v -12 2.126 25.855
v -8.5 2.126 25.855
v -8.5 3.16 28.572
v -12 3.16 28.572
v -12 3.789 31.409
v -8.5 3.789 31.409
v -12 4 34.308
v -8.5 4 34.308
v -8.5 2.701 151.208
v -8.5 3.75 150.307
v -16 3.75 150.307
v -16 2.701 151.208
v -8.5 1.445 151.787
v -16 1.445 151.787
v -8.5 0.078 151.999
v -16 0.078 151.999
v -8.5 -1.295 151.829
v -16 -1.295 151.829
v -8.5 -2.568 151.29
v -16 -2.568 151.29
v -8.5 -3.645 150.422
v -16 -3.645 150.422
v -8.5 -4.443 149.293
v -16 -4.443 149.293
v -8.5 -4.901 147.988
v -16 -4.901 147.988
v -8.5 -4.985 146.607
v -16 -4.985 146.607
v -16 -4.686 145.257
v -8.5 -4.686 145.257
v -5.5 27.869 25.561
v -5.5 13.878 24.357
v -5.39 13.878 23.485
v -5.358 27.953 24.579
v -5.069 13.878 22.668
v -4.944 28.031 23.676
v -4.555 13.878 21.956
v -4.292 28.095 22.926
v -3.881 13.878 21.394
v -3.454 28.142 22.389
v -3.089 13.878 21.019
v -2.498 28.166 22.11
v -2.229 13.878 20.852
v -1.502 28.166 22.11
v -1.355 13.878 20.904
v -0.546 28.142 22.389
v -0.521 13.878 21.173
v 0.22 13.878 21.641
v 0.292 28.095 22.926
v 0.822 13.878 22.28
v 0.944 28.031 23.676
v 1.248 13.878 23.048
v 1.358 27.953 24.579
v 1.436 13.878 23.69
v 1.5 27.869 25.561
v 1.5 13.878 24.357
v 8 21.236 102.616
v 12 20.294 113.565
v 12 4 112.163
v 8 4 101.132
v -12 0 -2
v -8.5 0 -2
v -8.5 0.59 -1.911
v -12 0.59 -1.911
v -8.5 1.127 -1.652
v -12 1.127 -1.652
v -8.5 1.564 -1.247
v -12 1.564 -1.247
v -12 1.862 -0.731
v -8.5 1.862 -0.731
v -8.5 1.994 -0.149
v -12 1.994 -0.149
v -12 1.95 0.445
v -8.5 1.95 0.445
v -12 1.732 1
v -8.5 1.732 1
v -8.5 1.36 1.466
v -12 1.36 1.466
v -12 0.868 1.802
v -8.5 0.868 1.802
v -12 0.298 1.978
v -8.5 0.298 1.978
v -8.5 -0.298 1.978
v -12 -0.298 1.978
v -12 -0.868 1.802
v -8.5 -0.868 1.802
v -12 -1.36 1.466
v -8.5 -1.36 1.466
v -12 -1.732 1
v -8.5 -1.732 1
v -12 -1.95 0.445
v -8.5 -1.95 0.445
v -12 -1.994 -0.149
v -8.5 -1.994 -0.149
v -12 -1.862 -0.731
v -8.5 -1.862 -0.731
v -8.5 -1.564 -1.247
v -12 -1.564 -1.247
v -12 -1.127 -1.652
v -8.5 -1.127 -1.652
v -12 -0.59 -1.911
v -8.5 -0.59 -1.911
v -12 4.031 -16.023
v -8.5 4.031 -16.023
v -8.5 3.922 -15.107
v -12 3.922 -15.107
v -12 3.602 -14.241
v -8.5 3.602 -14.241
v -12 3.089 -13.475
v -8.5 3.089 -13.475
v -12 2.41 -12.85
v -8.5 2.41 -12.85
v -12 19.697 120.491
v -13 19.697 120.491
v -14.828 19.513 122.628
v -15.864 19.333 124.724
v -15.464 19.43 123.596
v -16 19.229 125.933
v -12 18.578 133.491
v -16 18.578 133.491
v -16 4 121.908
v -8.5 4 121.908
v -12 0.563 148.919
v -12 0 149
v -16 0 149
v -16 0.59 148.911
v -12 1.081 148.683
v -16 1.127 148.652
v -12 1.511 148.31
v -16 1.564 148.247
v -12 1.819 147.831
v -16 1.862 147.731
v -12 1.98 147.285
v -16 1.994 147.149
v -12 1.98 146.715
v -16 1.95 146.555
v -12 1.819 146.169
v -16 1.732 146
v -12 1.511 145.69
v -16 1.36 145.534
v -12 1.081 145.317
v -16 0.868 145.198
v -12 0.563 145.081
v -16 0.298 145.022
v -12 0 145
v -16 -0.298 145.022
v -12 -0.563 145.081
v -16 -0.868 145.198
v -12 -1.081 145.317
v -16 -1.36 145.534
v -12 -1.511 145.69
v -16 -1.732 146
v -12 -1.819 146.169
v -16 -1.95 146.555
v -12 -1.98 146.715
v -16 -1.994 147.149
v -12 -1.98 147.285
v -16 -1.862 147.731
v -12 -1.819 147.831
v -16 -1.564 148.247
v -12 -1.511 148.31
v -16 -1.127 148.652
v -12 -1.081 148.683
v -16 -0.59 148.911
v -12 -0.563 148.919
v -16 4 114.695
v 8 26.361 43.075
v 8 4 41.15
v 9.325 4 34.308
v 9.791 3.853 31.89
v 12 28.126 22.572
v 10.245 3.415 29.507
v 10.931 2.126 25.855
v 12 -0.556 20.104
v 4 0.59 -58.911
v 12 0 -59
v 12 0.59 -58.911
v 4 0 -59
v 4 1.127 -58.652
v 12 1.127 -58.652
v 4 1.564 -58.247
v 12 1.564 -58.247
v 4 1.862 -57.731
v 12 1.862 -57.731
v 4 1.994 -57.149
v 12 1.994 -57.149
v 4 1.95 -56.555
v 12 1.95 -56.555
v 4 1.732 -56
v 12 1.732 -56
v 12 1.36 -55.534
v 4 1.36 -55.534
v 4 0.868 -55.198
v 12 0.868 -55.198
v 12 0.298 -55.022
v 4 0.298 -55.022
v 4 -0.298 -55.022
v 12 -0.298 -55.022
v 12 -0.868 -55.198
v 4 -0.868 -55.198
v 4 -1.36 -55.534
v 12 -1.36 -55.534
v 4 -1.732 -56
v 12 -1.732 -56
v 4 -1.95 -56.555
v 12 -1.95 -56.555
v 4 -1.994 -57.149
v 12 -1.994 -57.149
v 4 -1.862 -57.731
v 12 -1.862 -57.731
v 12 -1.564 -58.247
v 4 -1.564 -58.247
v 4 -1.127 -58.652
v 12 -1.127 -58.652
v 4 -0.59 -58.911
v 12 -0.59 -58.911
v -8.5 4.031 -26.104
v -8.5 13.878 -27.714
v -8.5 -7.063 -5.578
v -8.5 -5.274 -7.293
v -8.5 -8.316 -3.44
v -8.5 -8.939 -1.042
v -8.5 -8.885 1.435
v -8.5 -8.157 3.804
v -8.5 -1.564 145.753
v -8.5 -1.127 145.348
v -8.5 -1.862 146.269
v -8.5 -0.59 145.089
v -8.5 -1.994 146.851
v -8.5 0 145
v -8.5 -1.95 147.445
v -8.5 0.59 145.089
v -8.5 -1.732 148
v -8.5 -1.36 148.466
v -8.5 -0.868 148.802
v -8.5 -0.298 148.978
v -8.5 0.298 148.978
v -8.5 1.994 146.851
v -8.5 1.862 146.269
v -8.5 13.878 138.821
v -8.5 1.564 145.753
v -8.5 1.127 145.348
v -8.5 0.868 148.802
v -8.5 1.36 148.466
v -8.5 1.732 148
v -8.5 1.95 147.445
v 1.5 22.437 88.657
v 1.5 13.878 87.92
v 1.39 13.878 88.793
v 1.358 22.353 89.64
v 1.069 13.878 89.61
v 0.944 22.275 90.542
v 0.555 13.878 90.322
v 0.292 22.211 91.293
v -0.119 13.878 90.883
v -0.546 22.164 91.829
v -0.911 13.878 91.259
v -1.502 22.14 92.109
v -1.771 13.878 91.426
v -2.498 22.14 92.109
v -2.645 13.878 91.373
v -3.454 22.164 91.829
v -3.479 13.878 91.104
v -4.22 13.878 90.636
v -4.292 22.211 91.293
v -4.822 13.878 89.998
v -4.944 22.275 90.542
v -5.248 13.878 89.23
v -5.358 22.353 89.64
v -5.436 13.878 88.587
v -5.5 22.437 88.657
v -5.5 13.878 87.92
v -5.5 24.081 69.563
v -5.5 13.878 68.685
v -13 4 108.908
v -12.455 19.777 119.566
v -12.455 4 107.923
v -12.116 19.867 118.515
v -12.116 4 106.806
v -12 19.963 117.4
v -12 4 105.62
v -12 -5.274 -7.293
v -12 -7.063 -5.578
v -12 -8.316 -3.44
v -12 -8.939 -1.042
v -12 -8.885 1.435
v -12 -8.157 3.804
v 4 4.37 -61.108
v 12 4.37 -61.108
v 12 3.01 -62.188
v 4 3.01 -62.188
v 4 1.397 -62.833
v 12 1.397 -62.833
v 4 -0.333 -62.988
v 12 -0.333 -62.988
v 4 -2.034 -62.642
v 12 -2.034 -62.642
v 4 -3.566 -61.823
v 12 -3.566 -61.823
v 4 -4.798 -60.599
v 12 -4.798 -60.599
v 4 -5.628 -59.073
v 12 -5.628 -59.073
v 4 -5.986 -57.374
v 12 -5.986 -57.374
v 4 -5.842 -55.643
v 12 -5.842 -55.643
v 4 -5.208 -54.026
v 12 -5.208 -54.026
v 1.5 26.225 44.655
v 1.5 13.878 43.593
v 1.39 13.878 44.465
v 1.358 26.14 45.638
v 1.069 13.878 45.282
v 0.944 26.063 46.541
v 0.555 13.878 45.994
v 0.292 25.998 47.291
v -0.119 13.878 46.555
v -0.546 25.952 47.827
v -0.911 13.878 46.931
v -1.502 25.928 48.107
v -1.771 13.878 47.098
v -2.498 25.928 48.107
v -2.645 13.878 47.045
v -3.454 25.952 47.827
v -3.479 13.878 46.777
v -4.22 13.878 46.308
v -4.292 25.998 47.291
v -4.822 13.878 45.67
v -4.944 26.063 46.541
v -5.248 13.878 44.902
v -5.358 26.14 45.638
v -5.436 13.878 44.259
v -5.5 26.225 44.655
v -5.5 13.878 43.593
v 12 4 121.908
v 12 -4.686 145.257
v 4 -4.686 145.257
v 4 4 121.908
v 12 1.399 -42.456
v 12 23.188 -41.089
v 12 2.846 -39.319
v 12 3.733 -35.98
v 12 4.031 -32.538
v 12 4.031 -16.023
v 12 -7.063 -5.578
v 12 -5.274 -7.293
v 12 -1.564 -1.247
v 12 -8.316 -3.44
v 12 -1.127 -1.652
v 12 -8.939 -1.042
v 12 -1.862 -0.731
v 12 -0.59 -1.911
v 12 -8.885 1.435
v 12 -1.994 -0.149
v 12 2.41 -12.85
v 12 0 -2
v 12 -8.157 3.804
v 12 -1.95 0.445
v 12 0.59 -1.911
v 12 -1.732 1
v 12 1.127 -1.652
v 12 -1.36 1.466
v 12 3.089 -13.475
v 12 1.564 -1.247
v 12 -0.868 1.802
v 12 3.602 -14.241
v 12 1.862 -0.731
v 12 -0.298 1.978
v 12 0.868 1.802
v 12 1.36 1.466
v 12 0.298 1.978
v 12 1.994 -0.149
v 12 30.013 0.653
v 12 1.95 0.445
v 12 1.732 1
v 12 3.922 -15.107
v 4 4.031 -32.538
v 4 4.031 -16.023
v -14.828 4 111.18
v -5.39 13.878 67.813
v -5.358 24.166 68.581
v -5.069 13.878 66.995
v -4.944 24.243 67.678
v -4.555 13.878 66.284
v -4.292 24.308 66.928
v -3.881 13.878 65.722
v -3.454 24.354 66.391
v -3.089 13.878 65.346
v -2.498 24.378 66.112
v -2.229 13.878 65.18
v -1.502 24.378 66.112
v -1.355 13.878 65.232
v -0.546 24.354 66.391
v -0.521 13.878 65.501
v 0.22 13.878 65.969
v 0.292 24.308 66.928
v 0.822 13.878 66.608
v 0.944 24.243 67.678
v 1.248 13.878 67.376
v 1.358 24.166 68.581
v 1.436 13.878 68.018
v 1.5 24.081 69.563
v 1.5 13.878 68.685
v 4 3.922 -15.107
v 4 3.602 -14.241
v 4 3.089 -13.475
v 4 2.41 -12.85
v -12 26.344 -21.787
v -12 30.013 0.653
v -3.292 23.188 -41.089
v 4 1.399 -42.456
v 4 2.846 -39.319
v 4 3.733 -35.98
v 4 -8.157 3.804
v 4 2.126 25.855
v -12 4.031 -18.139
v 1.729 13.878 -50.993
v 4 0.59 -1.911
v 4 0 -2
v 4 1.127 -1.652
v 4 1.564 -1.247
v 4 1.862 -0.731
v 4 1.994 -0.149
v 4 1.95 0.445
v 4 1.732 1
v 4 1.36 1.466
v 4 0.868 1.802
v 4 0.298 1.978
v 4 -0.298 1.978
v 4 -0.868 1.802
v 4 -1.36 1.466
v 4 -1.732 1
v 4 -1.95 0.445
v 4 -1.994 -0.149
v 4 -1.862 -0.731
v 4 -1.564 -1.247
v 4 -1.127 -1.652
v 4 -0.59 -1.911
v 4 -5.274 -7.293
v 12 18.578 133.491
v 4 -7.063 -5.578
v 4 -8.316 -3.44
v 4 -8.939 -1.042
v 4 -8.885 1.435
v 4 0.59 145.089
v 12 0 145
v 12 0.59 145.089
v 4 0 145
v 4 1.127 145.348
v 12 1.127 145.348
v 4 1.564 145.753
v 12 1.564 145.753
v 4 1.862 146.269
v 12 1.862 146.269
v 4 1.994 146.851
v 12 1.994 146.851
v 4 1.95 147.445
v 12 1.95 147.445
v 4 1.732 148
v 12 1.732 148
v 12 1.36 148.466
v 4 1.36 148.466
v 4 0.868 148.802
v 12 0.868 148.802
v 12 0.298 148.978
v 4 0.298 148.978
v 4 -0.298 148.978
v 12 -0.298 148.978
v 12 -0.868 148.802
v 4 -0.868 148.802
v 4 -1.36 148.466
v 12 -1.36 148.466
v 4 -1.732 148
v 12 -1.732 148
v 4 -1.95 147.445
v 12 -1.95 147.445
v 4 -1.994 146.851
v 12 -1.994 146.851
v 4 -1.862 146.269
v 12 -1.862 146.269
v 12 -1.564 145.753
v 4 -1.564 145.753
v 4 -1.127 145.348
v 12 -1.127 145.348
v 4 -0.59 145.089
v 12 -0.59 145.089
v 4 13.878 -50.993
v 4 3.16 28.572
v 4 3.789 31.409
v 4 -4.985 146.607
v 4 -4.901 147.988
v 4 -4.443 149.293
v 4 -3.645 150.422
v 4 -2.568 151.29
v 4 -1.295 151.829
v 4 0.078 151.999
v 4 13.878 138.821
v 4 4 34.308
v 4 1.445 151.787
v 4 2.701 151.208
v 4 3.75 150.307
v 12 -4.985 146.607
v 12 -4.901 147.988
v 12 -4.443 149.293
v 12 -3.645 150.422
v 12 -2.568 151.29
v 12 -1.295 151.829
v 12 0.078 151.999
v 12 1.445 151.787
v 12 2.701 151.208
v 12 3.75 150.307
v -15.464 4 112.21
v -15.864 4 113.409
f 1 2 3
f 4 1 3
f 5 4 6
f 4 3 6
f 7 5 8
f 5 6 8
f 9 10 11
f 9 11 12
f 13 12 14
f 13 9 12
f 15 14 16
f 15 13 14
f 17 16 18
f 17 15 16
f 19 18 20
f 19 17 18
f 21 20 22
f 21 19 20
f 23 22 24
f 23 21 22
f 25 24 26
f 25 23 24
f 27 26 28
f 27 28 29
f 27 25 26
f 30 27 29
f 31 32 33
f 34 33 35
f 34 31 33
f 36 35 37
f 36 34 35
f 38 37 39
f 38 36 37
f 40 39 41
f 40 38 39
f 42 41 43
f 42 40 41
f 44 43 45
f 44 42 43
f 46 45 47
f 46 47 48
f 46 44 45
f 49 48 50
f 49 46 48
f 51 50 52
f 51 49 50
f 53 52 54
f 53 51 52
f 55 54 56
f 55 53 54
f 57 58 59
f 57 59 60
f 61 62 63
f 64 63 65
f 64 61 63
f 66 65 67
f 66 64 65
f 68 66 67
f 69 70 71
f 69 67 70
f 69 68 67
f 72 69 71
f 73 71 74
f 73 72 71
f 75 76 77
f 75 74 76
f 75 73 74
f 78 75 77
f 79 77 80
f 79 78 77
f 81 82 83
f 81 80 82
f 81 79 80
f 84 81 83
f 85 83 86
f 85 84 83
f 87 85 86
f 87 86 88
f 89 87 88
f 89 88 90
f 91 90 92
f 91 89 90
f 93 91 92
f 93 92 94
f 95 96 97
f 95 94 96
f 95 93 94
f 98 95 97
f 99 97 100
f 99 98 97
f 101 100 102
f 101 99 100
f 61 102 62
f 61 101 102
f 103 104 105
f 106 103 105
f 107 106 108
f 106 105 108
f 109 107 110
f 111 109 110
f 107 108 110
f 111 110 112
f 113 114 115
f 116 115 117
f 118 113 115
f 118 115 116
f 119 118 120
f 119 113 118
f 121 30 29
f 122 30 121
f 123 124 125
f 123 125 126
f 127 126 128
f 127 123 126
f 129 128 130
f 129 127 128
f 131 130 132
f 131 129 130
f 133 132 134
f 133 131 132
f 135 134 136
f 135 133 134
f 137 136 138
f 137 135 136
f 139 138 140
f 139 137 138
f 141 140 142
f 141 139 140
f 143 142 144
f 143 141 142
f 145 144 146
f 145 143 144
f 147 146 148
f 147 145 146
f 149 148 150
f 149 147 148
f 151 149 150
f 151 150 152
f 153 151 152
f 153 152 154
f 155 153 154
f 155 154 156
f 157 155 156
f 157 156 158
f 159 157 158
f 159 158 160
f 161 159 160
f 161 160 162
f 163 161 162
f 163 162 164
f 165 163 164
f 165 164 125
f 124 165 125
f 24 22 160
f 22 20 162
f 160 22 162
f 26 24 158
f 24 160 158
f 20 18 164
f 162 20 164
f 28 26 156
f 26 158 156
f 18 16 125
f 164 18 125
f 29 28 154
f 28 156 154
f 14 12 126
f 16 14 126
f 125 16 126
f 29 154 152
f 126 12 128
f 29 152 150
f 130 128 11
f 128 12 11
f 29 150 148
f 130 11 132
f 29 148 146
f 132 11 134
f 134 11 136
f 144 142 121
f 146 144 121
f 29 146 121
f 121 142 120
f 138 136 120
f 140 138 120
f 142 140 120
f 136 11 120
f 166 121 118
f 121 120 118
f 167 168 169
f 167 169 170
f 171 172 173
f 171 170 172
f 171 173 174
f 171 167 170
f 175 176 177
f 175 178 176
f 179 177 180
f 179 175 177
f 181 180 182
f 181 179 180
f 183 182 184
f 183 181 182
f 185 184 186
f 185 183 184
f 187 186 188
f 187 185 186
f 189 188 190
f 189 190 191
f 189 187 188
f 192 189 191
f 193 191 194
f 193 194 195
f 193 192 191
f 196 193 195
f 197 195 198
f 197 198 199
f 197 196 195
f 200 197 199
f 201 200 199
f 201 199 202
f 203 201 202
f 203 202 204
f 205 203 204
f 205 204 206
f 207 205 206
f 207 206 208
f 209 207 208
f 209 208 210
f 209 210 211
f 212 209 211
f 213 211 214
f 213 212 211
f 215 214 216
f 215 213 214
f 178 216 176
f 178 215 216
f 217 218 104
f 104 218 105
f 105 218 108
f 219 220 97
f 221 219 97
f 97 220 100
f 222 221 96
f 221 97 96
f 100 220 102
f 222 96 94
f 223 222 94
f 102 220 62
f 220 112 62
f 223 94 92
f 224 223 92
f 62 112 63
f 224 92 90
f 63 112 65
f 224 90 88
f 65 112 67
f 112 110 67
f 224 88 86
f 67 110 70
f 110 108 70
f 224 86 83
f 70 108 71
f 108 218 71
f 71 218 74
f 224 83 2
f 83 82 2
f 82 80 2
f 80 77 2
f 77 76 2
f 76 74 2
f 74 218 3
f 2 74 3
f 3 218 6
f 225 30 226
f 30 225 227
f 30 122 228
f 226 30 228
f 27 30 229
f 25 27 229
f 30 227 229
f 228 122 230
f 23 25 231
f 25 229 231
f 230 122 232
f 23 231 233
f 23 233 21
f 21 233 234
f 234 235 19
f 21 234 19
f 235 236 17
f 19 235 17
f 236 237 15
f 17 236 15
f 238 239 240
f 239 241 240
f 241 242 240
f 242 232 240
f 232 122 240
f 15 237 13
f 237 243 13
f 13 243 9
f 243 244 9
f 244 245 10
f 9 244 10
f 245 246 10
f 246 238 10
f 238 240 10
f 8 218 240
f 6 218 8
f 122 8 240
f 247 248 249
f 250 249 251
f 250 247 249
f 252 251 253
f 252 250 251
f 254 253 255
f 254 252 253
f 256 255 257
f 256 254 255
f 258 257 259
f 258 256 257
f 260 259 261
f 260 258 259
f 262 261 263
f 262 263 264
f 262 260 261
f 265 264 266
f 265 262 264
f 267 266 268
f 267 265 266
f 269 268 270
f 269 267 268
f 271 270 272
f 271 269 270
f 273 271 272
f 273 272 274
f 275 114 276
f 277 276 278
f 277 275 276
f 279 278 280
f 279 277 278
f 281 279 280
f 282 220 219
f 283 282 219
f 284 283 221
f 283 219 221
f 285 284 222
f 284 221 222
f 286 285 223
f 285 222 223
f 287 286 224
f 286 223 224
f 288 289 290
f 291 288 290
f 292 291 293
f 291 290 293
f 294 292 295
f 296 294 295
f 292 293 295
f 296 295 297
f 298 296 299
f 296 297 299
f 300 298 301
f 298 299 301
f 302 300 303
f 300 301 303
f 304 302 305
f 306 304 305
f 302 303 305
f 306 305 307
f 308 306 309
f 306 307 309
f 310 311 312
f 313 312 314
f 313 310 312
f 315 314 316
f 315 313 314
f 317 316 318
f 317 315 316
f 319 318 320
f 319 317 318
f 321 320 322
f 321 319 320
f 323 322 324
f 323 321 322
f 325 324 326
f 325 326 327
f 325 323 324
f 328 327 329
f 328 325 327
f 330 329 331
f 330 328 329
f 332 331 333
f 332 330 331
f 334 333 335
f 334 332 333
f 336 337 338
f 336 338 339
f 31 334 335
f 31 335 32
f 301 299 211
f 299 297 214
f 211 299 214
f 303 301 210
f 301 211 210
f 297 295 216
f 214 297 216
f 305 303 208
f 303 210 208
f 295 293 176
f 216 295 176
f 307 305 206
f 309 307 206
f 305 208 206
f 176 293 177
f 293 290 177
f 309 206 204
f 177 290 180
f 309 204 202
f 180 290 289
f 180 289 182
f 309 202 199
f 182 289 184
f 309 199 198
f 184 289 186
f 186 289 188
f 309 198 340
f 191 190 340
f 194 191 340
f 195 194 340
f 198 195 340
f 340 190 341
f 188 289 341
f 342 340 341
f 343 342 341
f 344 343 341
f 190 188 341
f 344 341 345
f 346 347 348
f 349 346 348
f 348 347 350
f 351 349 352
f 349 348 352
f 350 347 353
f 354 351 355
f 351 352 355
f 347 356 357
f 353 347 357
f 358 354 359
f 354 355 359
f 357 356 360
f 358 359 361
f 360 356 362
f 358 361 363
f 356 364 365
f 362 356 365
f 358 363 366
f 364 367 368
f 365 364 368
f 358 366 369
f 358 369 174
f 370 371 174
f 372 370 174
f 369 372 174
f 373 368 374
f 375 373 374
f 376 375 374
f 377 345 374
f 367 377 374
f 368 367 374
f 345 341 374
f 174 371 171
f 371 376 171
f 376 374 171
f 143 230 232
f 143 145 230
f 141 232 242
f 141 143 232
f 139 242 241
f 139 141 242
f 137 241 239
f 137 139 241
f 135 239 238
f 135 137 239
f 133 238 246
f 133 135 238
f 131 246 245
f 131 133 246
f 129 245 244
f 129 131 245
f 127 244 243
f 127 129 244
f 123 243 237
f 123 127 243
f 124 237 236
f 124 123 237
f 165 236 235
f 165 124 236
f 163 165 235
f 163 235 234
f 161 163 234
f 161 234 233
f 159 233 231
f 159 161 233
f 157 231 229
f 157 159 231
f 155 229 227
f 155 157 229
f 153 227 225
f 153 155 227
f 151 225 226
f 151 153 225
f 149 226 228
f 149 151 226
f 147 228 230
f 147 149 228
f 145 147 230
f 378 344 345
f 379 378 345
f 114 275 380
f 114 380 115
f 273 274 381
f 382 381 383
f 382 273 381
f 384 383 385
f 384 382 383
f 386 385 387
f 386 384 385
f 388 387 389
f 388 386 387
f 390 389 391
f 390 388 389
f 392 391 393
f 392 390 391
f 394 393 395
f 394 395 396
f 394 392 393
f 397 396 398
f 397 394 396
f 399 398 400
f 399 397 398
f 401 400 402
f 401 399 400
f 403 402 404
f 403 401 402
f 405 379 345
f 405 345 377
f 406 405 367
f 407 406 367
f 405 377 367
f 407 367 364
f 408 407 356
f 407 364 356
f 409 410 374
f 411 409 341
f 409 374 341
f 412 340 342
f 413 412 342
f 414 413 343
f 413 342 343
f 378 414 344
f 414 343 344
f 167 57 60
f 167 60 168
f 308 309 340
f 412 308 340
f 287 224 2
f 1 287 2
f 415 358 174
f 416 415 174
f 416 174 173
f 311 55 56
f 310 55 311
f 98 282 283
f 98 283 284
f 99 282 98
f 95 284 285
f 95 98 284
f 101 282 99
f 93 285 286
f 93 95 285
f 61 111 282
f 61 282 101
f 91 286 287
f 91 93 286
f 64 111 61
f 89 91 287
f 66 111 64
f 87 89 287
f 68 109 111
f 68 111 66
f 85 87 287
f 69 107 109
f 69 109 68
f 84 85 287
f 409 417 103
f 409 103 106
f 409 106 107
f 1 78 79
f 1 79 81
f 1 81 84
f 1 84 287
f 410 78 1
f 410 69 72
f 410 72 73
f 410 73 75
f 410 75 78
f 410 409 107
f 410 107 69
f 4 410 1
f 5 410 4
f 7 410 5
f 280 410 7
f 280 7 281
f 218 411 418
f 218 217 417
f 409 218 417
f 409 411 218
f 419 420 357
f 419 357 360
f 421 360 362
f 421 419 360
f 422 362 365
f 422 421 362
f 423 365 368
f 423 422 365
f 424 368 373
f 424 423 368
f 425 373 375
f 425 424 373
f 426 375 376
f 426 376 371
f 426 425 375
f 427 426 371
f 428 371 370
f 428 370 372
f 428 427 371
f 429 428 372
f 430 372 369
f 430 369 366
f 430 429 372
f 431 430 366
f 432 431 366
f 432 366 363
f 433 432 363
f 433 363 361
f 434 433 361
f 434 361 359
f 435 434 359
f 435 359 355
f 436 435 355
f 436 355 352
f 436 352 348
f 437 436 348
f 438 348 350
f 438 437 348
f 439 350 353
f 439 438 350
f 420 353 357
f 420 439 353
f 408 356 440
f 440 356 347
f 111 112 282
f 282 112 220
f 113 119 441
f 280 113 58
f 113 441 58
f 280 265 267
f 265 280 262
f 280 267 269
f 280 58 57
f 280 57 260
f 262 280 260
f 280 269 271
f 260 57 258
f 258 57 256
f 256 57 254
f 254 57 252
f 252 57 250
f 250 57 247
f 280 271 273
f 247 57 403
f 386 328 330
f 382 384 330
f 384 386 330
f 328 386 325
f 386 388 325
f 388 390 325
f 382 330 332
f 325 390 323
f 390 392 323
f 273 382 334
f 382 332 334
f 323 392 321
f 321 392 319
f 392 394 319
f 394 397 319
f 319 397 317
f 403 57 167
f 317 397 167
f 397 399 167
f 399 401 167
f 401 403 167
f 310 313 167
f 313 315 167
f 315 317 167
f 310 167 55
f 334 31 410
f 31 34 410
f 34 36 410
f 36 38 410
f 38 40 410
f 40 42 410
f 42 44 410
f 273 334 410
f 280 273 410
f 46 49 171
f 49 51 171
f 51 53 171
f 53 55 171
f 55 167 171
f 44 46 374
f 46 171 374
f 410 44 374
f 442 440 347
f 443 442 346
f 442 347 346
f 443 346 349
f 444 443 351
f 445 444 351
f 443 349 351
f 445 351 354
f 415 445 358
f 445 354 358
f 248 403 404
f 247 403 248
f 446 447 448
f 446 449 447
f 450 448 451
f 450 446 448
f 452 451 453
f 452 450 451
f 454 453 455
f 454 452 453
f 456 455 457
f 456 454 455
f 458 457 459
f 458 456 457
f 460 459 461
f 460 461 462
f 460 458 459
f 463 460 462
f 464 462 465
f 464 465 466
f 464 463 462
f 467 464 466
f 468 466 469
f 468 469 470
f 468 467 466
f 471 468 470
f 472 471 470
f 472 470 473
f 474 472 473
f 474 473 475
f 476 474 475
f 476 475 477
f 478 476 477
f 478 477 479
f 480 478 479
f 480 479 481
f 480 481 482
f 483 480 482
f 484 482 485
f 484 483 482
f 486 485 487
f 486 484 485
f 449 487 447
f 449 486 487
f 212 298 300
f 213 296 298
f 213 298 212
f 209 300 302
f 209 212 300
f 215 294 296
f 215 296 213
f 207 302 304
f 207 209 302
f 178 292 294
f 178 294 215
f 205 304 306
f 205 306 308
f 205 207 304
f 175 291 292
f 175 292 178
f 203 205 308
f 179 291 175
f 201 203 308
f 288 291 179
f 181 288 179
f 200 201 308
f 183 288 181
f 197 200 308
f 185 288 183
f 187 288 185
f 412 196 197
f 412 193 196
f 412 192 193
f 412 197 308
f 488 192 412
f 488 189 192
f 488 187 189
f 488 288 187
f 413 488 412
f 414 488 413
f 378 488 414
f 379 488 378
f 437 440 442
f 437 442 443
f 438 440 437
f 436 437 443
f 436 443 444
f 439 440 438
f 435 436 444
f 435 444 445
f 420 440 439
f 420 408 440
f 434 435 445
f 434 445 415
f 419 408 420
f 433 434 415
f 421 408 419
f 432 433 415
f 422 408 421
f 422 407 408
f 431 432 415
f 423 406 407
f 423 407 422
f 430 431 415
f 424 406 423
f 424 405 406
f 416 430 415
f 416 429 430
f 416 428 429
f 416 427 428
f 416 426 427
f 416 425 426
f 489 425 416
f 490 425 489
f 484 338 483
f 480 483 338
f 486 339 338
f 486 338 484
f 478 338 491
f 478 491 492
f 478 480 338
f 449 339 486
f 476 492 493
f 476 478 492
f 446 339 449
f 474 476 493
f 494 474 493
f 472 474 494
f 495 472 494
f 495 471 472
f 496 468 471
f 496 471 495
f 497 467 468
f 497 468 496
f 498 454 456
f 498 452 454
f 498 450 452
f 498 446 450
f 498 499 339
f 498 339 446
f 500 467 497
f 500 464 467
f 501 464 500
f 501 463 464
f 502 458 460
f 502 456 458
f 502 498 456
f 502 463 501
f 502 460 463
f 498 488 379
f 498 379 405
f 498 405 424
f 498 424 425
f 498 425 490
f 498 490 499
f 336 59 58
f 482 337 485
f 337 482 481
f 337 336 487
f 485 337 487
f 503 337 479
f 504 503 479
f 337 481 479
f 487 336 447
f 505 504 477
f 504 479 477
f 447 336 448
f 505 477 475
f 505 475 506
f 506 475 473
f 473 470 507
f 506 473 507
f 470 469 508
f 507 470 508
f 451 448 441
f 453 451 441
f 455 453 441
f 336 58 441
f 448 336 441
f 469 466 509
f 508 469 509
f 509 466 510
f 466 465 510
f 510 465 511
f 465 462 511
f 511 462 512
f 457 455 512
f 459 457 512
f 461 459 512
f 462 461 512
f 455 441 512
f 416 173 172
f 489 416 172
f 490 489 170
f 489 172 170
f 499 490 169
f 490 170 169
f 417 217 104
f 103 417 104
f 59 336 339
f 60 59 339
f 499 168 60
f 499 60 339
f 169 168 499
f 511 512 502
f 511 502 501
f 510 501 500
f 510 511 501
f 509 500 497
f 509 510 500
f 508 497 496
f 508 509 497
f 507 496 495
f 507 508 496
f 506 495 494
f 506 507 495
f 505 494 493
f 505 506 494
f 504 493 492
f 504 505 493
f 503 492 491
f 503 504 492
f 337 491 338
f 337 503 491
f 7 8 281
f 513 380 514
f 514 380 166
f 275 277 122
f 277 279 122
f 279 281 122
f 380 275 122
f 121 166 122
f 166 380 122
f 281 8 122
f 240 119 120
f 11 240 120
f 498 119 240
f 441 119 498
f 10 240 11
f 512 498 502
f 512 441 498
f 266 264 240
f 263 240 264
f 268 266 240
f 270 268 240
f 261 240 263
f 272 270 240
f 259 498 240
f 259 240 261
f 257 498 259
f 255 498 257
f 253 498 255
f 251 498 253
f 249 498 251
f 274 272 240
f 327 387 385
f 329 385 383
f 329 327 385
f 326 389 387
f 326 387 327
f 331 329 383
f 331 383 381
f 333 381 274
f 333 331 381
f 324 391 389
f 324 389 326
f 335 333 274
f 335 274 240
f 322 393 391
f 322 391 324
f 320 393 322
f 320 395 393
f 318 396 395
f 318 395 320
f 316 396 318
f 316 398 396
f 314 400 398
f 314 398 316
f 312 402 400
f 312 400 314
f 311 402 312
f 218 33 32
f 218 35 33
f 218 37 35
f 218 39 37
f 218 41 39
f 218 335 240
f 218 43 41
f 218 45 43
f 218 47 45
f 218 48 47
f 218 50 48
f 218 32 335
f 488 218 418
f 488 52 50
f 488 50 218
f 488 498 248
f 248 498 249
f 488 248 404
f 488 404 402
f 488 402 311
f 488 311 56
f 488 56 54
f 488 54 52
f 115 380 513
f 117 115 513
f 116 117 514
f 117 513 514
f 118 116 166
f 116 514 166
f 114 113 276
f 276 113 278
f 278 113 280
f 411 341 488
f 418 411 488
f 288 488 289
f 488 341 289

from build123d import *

# Parameters (mm, degrees)
SKETCH1_R           = 2
BOSS_EXTRUDE1_DEPTH = 12
CUT_EXTRUDE1_DEPTH  = 162.777588211
SKETCH5_R           = 2
BOSS_EXTRUDE3_DEPTH = 4
CUT_EXTRUDE2_DEPTH  = 12.5
CHAMFER1_SIZE       = 3
FILLET1_R           = 4
CUT_EXTRUDE3_DEPTH  = 156.224708777
CUT_EXTRUDE4_DEPTH  = 156.224708777


with BuildPart() as part:
    # Sketch1 → Boss-Extrude1 (new, symmetric)
    with BuildSketch(Plane(origin=(0, 0, 0), x_dir=(0, 0, -1), z_dir=(1, 0, 0))):
        with BuildLine():
            Line((-121.907859823, 4), (-145.256630116, -4.68622038))
            ThreePointArc((-145.256630116, -4.68622038), (-151.290045259, -2.568172828), (-150.306967189, 3.75019573))
            Line((-150.306967189, 3.75019573), (-133.491442782, 18.578325107))
            Line((-133.491442782, 18.578325107), (-0.653491001, 30.01252535))
            Line((-0.653491001, 30.01252535), (41.089036304, 23.188119662))
            Line((41.089036304, 23.188119662), (61.107888441, 4.370001963))
            ThreePointArc((61.107888441, 4.370001963), (61.822541623, -3.565775777), (54.025769542, -5.208225973))
            Line((54.025769542, -5.208225973), (42.456256278, 1.398706774))
            ThreePointArc((42.456256278, 1.398706774), (37.66895292, 3.361815488), (32.53825078, 4.031117219))
            Line((32.53825078, 4.031117219), (16.022685374, 4.031117219))
            ThreePointArc((16.022685374, 4.031117219), (14.241499513, 3.602468352), (12.850348738, 2.410385115))
            Line((12.850348738, 2.410385115), (7.292636005, -5.274226019))
            ThreePointArc((7.292636005, -5.274226019), (2.262889815, -8.71087422), (-3.803564356, -8.156770083))
            Line((-3.803564356, -8.156770083), (-25.855369948, 2.126155741))
            ThreePointArc((-25.855369948, 2.126155741), (-29.978942905, 3.525920142), (-34.307735183, 4))
            Line((-34.307735183, 4), (-121.907859823, 4))
        make_face()
        Circle(SKETCH1_R, mode=Mode.SUBTRACT)
        with Locations((57, 0)):
            Circle(SKETCH1_R, mode=Mode.SUBTRACT)
        with Locations((-147, 0)):
            Circle(SKETCH1_R, mode=Mode.SUBTRACT)
    extrude(amount=BOSS_EXTRUDE1_DEPTH, both=True)

    # Sketch2 → Cut-Extrude1 (cut, through all)
    with BuildSketch(Plane(origin=(0, 29.127166191, -4.761944507), x_dir=(1, 0, 0), z_dir=(0, 0.9868978946219392, -0.16134604299698216))):
        Polygon((3.5, 62.250818245), (3.5, 52.064388241), (-12, 17.250818245), (-12, 62.250818245), align=None)
    extrude(amount=-CUT_EXTRUDE1_DEPTH, mode=Mode.SUBTRACT)

    # Sketch5 → Boss-Extrude3 (add)
    with BuildSketch(Plane.ZY.offset(12)):
        with BuildLine():
            Line((145.256630116, -4.68622038), (121.907859823, 4))
            Line((121.907859823, 4), (108.907859823, 4))
            Line((108.907859823, 4), (120.491442782, 19.697317091))
            Line((120.491442782, 19.697317091), (133.491442782, 18.578325107))
            Line((133.491442782, 18.578325107), (150.306967189, 3.75019573))
            ThreePointArc((150.306967189, 3.75019573), (151.290045259, -2.568172828), (145.256630116, -4.68622038))
        make_face()
        with Locations((147, 0)):
            Circle(SKETCH5_R, mode=Mode.SUBTRACT)
    extrude(amount=BOSS_EXTRUDE3_DEPTH)

    # Sketch6 → Cut-Extrude2 (cut)
    with BuildSketch(Plane(origin=(4, 0, 0), x_dir=(0, 0, -1), z_dir=(1, 0, 0))):
        with BuildLine():
            Line((-150.306967189, 3.75019573), (-138.821377712, 13.878325107))
            Line((-138.821377712, 13.878325107), (50.992864285, 13.878325107))
            Line((50.992864285, 13.878325107), (61.107888441, 4.370001963))
            ThreePointArc((61.107888441, 4.370001963), (61.822541623, -3.565775777), (54.025769542, -5.208225973))
            Line((54.025769542, -5.208225973), (42.456256278, 1.398706774))
            ThreePointArc((42.456256278, 1.398706774), (37.66895292, 3.361815488), (32.53825078, 4.031117219))
            Line((32.53825078, 4.031117219), (16.022685374, 4.031117219))
            ThreePointArc((16.022685374, 4.031117219), (14.241499513, 3.602468352), (12.850348738, 2.410385115))
            Line((12.850348738, 2.410385115), (7.292636005, -5.274226019))
            ThreePointArc((7.292636005, -5.274226019), (2.262889815, -8.71087422), (-3.803564356, -8.156770083))
            Line((-3.803564356, -8.156770083), (-25.855369948, 2.126155741))
            ThreePointArc((-25.855369948, 2.126155741), (-29.978942905, 3.525920142), (-34.307735183, 4))
            Line((-34.307735183, 4), (-121.907859823, 4))
            Line((-121.907859823, 4), (-145.256630116, -4.68622038))
            ThreePointArc((-145.256630116, -4.68622038), (-151.290045259, -2.568172828), (-150.306967189, 3.75019573))
        make_face()
    extrude(amount=-CUT_EXTRUDE2_DEPTH, mode=Mode.SUBTRACT)

    # Chamfer1
    chamfer1_edges = [part.edges().sort_by_distance(p)[0] for p in [
        (-16, 11.848658545, 114.699651303),
    ]]
    chamfer(chamfer1_edges, length=CHAMFER1_SIZE)

    # Fillet1
    # the kernel refuses this fillet: 4 mm, written as the material it adds along each edge
    with BuildSketch(Plane(origin=(-12, -1.322167469, 104.980451844), x_dir=(-1, 0, 0), z_dir=(0, 0.8046360890172893, 0.593768274877465))) as fillet1_piece_1_section:
        with BuildLine():
            CenterArc((4, -2.645751311), FILLET1_R, 138.590377891, 41.409622109)
            Line((0, -2.645751311), (0, 0))
            Line((0, 0), (1, 0))
        make_face()
    fillet1_piece_1 = extrude(amount=32.737348458, mode=Mode.PRIVATE)
    fillet1_piece_1 = split(fillet1_piece_1, bisect_by=Plane(origin=(-12, 20.868035787, 106.890502579), z_dir=(0, -0.9963158941582452, -0.08575919220501364)), keep=Keep.TOP, mode=Mode.PRIVATE)
    fillet1_piece_1 = split(fillet1_piece_1, bisect_by=Plane(origin=(-12, 4, 104.980451844), z_dir=(0, 1, 0)), keep=Keep.TOP, mode=Mode.PRIVATE)
    add(fillet1_piece_1)
    # the kernel refuses this fillet: 4 mm, written as the material it takes off along each edge
    with BuildSketch(Plane(origin=(-16, 0.667088192, 110.176784644), x_dir=(0, -0.593768274877465, 0.8046360890172894), z_dir=(0, 0.8046360890172893, 0.593768274877465))) as fillet1_2_piece_1:
        with BuildLine():
            CenterArc((FILLET1_R * 0.414213562373, FILLET1_R), FILLET1_R, 225, 45)
            Line((-FILLET1_R * 0.292893218813, FILLET1_R * 0.292893218813), (0, 0))
            Line((0, 0), (FILLET1_R * 0.414213562373, 0))
        make_face()
    extrude(amount=27.417837682, mode=Mode.SUBTRACT)

    # Sketch7 → Cut-Extrude3 (cut, through all)
    with BuildSketch(Plane(origin=(0, 29.847630452, 2.569173785), x_dir=(1, 0, 0), z_dir=(0, 0.9963158941582453, 0.08575919220501363))):
        Polygon((12, -111.406384024), (8, -100.416474347), (8, -40.655449605), (12, -20.077233541), align=None)
    extrude(amount=-CUT_EXTRUDE3_DEPTH, mode=Mode.SUBTRACT)

    # Sketch8 → Cut-Extrude4 (cut, through all)
    with BuildSketch(Plane(origin=(0, 29.847630452, 2.569173785), x_dir=(1, 0, 0), z_dir=(0, 0.9963158941582453, 0.08575919220501363))):
        with BuildLine():
            Line((-5.5, -42.241808783), (-5.5, -23.077233541))
            ThreePointArc((-5.5, -23.077233541), (-2, -19.577233541), (1.5, -23.077233541))
            Line((1.5, -23.077233541), (1.5, -42.241808783))
            ThreePointArc((1.5, -42.241808783), (-2, -45.741808783), (-5.5, -42.241808783))
        make_face()
        with BuildLine():
            Line((-5.5, -86.406384024), (-5.5, -67.241808783))
            ThreePointArc((-5.5, -67.241808783), (-2, -63.741808783), (1.5, -67.241808783))
            Line((1.5, -67.241808783), (1.5, -86.406384024))
            ThreePointArc((1.5, -86.406384024), (-2, -89.906384024), (-5.5, -86.406384024))
        make_face()
    extrude(amount=-CUT_EXTRUDE4_DEPTH, mode=Mode.SUBTRACT)


solid = part.part
